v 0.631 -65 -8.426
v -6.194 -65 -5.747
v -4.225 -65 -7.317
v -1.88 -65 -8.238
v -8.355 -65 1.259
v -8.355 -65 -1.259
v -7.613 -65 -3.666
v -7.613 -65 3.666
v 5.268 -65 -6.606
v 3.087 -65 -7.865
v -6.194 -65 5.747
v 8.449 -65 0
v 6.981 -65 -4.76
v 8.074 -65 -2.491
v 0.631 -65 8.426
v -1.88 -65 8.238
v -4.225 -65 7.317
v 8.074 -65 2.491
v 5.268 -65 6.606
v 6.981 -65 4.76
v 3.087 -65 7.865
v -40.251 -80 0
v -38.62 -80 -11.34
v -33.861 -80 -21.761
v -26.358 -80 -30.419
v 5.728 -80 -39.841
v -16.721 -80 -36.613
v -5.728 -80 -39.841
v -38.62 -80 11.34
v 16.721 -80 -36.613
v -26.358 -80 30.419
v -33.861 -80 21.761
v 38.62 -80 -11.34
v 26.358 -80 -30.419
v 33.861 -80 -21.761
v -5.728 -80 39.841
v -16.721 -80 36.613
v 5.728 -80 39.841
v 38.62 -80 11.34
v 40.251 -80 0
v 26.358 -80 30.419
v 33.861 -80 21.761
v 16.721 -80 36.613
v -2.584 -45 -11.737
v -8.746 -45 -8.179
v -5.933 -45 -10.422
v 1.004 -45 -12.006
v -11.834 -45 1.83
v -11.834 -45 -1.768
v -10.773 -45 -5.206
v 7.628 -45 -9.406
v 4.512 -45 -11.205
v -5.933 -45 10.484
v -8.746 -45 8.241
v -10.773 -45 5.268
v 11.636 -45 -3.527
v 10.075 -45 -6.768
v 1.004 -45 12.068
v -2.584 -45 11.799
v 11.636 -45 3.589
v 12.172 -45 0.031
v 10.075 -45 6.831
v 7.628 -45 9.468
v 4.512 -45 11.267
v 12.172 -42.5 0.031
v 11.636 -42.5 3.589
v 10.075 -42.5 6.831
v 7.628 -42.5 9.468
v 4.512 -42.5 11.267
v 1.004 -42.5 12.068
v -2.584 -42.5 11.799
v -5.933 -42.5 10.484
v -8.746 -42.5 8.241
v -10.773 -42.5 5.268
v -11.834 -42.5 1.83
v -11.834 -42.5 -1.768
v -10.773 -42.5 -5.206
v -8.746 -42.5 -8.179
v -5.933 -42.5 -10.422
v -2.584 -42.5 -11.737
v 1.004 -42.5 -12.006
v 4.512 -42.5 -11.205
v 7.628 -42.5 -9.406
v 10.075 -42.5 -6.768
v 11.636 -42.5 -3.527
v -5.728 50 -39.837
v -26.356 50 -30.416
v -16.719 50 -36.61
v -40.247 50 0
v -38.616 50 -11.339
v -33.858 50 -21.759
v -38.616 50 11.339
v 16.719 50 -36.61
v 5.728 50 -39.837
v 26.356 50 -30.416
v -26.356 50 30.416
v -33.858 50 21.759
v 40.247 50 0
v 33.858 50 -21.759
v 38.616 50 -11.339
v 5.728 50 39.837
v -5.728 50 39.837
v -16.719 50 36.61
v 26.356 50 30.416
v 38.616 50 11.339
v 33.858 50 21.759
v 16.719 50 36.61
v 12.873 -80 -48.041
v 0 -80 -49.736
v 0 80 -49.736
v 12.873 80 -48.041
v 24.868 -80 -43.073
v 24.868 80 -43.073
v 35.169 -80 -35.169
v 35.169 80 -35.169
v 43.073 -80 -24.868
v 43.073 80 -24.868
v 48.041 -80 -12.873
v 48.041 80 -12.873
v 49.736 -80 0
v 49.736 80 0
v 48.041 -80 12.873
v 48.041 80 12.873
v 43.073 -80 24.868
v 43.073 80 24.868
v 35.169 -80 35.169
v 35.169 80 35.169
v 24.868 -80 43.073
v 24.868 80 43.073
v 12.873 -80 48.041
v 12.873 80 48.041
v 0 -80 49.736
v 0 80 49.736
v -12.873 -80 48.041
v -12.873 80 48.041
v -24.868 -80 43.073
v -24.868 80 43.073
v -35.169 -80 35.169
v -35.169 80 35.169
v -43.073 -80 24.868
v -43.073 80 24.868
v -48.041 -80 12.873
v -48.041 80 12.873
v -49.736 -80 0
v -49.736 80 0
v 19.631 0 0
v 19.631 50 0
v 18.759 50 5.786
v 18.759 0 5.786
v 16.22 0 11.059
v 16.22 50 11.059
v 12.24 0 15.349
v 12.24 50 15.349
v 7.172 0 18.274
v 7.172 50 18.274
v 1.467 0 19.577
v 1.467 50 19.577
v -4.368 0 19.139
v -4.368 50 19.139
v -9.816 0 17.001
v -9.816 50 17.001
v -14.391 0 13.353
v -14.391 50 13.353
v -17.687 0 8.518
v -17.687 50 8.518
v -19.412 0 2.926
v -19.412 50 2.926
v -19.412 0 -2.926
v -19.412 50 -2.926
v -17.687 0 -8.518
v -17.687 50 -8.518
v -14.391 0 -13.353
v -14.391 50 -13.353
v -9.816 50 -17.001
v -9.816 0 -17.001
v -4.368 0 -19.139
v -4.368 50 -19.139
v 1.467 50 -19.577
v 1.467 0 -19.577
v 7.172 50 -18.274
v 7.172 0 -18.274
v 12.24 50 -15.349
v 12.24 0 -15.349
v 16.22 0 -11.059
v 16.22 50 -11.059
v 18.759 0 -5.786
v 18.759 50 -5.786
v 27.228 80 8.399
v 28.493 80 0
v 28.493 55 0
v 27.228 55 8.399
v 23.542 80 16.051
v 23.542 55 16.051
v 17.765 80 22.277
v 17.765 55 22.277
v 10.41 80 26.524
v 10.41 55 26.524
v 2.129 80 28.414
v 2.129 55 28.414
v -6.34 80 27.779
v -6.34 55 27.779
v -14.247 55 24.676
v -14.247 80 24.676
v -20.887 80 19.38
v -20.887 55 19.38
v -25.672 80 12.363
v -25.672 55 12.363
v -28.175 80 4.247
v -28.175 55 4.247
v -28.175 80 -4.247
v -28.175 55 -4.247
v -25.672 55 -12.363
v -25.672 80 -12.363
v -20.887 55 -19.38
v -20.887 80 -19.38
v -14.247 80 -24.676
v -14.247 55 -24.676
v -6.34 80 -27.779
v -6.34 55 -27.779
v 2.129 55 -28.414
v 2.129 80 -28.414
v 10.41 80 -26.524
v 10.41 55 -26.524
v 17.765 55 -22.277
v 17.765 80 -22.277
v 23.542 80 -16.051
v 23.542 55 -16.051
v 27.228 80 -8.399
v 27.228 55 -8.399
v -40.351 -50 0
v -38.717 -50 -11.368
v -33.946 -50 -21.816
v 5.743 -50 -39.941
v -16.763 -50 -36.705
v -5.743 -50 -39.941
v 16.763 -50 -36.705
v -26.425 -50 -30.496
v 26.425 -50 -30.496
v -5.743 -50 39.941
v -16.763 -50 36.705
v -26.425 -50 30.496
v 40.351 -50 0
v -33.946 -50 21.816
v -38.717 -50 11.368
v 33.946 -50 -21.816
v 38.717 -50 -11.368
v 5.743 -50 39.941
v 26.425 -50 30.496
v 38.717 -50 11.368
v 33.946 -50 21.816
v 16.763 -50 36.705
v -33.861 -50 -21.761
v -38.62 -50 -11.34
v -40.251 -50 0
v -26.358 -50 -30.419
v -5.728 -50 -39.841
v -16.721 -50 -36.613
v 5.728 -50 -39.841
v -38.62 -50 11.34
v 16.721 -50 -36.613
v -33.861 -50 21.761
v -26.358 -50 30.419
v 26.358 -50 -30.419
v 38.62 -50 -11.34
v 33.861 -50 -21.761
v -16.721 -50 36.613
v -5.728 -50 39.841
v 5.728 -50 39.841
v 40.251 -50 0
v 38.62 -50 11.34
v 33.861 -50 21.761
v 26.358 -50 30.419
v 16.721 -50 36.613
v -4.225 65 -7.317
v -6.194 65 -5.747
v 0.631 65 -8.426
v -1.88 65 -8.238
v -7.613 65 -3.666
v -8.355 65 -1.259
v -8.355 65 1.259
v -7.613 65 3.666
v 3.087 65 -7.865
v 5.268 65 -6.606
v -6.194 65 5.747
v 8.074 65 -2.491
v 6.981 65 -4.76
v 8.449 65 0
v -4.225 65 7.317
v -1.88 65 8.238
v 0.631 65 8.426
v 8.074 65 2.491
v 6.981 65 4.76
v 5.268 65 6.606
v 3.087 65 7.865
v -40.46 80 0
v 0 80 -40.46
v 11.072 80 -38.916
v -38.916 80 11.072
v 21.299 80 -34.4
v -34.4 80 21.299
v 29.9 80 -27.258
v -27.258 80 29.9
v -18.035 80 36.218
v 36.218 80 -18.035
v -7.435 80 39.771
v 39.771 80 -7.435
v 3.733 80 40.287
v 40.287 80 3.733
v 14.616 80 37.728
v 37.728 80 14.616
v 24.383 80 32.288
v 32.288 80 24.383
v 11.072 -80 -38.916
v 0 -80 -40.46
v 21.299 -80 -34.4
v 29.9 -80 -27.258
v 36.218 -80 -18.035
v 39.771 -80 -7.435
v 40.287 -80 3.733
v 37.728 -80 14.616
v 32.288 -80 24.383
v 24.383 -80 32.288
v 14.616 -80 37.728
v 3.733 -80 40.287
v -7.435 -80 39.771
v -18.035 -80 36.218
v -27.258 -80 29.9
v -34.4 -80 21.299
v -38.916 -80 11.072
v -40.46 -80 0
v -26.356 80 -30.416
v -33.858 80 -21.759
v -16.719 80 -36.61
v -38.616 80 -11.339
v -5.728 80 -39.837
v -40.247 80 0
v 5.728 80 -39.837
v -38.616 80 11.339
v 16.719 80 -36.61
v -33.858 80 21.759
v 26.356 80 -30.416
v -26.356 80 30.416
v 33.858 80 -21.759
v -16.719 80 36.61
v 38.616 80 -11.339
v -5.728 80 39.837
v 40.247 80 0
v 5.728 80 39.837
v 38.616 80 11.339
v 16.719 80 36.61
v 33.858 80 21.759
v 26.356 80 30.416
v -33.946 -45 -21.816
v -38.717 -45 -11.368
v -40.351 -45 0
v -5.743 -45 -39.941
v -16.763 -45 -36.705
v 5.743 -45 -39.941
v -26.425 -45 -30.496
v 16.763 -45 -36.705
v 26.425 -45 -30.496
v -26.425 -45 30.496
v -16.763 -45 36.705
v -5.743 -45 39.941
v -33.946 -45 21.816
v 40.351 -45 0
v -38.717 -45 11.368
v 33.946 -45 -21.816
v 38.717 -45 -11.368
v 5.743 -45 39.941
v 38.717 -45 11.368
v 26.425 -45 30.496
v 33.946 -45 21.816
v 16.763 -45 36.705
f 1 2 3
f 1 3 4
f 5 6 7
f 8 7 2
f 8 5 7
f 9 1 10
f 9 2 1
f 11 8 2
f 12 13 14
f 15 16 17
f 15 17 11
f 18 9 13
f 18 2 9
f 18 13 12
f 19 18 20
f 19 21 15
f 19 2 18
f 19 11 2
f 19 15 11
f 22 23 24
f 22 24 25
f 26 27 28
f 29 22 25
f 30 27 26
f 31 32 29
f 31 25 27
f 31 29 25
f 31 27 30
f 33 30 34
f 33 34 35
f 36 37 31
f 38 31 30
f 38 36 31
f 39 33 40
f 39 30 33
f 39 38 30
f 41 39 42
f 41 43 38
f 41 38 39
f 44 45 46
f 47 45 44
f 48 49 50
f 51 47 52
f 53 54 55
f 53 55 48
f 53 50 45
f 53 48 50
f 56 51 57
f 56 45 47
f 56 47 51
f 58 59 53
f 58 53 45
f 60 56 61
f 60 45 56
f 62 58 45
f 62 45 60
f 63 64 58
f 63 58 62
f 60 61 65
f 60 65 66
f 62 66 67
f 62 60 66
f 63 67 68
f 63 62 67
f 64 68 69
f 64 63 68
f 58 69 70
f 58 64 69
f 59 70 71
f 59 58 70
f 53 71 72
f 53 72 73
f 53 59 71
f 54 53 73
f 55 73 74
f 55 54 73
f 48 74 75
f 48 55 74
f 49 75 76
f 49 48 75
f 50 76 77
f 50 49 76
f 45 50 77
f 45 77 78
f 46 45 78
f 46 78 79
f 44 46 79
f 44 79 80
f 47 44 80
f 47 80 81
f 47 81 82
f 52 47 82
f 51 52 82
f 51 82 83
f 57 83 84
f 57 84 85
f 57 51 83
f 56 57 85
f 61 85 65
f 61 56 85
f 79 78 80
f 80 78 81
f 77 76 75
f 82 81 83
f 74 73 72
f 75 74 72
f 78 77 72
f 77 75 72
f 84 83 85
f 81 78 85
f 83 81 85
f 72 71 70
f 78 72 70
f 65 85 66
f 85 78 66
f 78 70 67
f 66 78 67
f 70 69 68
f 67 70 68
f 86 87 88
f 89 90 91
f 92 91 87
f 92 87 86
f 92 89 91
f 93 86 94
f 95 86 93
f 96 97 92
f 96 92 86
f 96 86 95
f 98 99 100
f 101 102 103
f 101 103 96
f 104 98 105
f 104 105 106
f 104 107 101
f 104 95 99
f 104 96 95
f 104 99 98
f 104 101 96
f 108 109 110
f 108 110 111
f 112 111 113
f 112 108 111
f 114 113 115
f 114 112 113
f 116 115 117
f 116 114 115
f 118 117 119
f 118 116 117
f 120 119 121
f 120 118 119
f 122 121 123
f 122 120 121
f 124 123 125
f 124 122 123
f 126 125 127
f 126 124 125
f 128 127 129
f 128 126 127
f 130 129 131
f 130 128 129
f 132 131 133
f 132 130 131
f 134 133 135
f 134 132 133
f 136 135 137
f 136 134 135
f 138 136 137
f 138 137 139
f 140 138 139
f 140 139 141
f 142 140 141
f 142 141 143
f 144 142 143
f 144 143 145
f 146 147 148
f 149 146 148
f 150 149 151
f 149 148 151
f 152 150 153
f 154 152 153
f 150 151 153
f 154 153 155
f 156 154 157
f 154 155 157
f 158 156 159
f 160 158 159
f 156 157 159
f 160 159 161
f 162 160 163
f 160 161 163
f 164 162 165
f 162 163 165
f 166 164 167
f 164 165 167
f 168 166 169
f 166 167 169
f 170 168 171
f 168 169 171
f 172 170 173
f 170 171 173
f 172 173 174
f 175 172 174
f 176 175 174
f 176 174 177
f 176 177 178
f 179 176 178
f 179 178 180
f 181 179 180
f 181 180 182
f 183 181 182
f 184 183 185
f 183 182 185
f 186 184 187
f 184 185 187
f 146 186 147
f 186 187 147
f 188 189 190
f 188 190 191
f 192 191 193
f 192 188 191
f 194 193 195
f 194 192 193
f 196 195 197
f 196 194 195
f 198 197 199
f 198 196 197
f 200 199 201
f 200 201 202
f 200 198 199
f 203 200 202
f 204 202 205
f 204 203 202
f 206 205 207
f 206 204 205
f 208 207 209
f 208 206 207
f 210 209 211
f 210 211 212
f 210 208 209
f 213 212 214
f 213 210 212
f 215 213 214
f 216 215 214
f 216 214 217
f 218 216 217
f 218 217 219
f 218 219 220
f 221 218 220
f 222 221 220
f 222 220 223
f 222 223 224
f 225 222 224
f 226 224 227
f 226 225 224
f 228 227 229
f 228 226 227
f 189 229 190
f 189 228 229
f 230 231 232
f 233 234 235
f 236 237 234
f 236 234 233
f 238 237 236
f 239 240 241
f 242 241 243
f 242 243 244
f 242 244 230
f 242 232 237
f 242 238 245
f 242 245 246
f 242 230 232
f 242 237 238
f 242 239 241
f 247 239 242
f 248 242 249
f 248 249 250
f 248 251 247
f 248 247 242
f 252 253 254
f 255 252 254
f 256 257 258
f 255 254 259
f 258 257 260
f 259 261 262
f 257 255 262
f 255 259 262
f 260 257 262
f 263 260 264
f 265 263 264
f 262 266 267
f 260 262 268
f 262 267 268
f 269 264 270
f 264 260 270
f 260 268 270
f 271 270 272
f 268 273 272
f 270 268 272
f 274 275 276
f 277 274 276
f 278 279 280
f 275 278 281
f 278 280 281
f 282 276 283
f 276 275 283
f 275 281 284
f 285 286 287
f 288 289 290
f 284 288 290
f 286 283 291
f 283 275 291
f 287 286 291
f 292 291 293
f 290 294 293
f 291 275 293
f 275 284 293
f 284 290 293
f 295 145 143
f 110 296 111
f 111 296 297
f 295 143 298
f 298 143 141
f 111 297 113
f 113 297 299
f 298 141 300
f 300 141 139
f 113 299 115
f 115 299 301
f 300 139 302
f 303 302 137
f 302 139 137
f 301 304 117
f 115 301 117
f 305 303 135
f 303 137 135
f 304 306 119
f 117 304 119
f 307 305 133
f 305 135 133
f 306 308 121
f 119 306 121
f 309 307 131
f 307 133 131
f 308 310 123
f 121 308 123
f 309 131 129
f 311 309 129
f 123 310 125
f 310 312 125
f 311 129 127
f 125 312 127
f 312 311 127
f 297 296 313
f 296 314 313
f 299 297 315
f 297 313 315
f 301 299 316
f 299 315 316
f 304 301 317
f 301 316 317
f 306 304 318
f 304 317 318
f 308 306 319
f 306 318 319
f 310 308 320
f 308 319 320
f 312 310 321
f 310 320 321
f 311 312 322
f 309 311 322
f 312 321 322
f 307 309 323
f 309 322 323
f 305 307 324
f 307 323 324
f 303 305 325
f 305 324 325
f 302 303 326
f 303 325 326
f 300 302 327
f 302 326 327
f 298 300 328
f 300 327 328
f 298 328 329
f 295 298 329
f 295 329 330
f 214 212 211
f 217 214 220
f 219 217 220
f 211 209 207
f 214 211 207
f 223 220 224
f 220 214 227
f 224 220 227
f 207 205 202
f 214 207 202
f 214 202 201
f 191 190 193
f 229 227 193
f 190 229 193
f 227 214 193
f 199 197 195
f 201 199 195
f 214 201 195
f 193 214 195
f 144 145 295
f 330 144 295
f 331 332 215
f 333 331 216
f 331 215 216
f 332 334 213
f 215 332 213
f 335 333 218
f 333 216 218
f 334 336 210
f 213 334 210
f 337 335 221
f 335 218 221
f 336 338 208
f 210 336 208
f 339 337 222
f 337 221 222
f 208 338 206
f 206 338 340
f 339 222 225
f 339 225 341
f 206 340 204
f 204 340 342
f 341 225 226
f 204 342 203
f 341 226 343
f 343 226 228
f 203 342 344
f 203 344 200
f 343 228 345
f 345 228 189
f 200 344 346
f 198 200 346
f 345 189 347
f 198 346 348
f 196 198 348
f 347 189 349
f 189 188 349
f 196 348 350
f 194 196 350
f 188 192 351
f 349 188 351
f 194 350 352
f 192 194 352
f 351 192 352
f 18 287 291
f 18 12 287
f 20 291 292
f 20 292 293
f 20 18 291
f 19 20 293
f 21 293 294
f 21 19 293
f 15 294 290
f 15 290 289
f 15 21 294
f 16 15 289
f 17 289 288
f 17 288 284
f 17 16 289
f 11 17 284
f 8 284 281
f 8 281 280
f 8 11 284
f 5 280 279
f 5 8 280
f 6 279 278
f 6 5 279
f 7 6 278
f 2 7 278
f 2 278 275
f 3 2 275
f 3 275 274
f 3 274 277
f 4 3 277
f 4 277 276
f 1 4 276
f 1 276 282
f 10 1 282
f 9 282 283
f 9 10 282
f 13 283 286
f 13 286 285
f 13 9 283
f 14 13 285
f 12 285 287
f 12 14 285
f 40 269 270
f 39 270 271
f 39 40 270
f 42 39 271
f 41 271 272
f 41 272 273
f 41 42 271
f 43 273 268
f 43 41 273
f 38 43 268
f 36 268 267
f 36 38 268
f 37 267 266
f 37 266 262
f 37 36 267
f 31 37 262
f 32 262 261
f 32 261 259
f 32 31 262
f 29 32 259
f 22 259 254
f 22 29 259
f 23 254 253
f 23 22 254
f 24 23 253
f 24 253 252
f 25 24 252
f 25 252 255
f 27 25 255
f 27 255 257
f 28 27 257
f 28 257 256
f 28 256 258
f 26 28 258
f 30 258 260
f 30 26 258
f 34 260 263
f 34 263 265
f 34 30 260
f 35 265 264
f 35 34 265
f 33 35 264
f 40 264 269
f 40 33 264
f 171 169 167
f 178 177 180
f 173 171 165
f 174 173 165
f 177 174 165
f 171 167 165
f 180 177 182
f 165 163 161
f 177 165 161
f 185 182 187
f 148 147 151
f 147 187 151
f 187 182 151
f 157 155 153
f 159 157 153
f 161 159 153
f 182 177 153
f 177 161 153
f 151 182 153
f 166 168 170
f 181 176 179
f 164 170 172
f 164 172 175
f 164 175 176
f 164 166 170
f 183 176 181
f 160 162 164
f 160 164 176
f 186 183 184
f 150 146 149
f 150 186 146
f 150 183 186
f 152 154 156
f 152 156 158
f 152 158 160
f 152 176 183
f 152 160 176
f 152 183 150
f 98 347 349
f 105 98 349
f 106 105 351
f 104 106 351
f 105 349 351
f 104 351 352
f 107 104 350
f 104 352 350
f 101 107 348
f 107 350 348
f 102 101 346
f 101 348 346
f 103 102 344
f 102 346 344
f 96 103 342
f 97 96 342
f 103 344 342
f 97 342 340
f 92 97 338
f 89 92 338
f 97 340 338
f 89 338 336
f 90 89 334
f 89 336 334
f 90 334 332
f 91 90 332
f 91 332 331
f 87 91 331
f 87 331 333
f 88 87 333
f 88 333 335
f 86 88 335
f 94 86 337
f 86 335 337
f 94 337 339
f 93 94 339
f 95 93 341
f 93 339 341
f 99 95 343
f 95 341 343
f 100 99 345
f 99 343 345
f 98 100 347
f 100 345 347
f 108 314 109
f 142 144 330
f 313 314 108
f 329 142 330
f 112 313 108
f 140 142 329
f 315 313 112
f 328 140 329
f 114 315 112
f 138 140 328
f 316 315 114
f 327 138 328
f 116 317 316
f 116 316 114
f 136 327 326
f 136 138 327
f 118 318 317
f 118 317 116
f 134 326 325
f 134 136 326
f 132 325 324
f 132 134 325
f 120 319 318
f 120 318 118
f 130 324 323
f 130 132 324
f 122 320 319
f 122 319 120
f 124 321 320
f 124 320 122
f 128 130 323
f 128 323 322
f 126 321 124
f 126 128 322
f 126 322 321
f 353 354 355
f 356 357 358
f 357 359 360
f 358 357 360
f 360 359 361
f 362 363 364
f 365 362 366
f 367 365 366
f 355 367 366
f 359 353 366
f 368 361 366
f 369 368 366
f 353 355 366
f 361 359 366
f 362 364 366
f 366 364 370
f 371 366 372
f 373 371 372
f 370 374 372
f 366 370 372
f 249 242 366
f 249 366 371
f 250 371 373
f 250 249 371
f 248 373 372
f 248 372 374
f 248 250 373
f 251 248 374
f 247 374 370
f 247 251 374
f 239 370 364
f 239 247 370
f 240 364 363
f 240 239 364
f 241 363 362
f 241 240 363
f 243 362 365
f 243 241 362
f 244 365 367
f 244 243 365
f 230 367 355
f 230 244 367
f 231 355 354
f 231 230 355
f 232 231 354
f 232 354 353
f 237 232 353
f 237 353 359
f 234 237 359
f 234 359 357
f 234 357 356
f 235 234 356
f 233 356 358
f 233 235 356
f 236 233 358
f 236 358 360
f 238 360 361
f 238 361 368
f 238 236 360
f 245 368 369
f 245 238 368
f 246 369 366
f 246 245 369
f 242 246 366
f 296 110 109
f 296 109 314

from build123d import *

# Parameters (mm, degrees)
F0_R      = 49.7360969104
F1_DEPTH  = 80
F2_R      = 40.4600824773
F3_DEPTH  = 90
F4_R      = 8.4494830611
F5_DEPTH  = 65
F7_R      = 40.2505245535
F8_DEPTH  = 30
F10_R     = 40.3514508638
F11_DEPTH = 5
F13_R     = 40.2465604933
F14_DEPTH = 30
F16_R     = 19.6314751685
F17_DEPTH = 50
F18_R     = 28.4934569002
F19_DEPTH = 25
F20_W     = 76.695650816
F20_H     = 61.7673955858
F21_DEPTH = 180
F23_R     = 12.0703792792
F24_DEPTH = 2.5


with BuildPart() as f1:
    # F0 (on Front) → F1 (new body, symmetric)
    with BuildSketch(Plane.XZ):
        Circle(F0_R)
    extrude(amount=F1_DEPTH, both=True)

    # F2 (on Front) → F3 (cut, symmetric)
    with BuildSketch(Plane.XZ):
        Circle(F2_R)
    extrude(amount=F3_DEPTH, both=True, mode=Mode.SUBTRACT)

    # F20 (on offset) → F21 (cut)
    with BuildSketch(Plane.XZ.offset(-80)):
        with Locations((-38.347825408, -30.8836977929)):
            Rectangle(F20_W, F20_H)
    extrude(amount=F21_DEPTH, mode=Mode.SUBTRACT)


with BuildPart() as f5:
    # F4 (on Front) → F5 (new body, symmetric)
    with BuildSketch(Plane.XZ):
        Circle(F4_R)
    extrude(amount=F5_DEPTH, both=True)


with BuildPart() as f8:
    # F7 (on offset) → F8 (new body)
    with BuildSketch(Plane.XZ.offset(80)):
        Circle(F7_R)
    extrude(amount=-F8_DEPTH)


with BuildPart() as f11:
    # F10 (on offset) → F11 (new body)
    with BuildSketch(Plane.XZ.offset(50)):
        Circle(F10_R)
    extrude(amount=-F11_DEPTH)


with BuildPart() as f14:
    # F13 (on offset) → F14 (new body)
    with BuildSketch(Plane.XZ.offset(-80)):
        Circle(F13_R)
    extrude(amount=F14_DEPTH)

    # F18 (on offset) → F19 (cut)
    with BuildSketch(Plane.XZ.offset(-80)):
        Circle(F18_R)
    extrude(amount=F19_DEPTH, mode=Mode.SUBTRACT)


with BuildPart() as f17:
    # F16 (on offset) → F17 (new body)
    with BuildSketch(Plane.XZ.offset(-50)):
        Circle(F16_R)
    extrude(amount=F17_DEPTH)


with BuildPart() as f24:
    # F23 (on offset) → F24 (new body)
    with BuildSketch(Plane.XZ.offset(45)):
        with Locations((0.1020442141, 0.0310293544)):
            Circle(F23_R)
    extrude(amount=-F24_DEPTH)


solid = Compound([f1.part, f5.part, f8.part, f11.part, f14.part, f17.part, f24.part])
